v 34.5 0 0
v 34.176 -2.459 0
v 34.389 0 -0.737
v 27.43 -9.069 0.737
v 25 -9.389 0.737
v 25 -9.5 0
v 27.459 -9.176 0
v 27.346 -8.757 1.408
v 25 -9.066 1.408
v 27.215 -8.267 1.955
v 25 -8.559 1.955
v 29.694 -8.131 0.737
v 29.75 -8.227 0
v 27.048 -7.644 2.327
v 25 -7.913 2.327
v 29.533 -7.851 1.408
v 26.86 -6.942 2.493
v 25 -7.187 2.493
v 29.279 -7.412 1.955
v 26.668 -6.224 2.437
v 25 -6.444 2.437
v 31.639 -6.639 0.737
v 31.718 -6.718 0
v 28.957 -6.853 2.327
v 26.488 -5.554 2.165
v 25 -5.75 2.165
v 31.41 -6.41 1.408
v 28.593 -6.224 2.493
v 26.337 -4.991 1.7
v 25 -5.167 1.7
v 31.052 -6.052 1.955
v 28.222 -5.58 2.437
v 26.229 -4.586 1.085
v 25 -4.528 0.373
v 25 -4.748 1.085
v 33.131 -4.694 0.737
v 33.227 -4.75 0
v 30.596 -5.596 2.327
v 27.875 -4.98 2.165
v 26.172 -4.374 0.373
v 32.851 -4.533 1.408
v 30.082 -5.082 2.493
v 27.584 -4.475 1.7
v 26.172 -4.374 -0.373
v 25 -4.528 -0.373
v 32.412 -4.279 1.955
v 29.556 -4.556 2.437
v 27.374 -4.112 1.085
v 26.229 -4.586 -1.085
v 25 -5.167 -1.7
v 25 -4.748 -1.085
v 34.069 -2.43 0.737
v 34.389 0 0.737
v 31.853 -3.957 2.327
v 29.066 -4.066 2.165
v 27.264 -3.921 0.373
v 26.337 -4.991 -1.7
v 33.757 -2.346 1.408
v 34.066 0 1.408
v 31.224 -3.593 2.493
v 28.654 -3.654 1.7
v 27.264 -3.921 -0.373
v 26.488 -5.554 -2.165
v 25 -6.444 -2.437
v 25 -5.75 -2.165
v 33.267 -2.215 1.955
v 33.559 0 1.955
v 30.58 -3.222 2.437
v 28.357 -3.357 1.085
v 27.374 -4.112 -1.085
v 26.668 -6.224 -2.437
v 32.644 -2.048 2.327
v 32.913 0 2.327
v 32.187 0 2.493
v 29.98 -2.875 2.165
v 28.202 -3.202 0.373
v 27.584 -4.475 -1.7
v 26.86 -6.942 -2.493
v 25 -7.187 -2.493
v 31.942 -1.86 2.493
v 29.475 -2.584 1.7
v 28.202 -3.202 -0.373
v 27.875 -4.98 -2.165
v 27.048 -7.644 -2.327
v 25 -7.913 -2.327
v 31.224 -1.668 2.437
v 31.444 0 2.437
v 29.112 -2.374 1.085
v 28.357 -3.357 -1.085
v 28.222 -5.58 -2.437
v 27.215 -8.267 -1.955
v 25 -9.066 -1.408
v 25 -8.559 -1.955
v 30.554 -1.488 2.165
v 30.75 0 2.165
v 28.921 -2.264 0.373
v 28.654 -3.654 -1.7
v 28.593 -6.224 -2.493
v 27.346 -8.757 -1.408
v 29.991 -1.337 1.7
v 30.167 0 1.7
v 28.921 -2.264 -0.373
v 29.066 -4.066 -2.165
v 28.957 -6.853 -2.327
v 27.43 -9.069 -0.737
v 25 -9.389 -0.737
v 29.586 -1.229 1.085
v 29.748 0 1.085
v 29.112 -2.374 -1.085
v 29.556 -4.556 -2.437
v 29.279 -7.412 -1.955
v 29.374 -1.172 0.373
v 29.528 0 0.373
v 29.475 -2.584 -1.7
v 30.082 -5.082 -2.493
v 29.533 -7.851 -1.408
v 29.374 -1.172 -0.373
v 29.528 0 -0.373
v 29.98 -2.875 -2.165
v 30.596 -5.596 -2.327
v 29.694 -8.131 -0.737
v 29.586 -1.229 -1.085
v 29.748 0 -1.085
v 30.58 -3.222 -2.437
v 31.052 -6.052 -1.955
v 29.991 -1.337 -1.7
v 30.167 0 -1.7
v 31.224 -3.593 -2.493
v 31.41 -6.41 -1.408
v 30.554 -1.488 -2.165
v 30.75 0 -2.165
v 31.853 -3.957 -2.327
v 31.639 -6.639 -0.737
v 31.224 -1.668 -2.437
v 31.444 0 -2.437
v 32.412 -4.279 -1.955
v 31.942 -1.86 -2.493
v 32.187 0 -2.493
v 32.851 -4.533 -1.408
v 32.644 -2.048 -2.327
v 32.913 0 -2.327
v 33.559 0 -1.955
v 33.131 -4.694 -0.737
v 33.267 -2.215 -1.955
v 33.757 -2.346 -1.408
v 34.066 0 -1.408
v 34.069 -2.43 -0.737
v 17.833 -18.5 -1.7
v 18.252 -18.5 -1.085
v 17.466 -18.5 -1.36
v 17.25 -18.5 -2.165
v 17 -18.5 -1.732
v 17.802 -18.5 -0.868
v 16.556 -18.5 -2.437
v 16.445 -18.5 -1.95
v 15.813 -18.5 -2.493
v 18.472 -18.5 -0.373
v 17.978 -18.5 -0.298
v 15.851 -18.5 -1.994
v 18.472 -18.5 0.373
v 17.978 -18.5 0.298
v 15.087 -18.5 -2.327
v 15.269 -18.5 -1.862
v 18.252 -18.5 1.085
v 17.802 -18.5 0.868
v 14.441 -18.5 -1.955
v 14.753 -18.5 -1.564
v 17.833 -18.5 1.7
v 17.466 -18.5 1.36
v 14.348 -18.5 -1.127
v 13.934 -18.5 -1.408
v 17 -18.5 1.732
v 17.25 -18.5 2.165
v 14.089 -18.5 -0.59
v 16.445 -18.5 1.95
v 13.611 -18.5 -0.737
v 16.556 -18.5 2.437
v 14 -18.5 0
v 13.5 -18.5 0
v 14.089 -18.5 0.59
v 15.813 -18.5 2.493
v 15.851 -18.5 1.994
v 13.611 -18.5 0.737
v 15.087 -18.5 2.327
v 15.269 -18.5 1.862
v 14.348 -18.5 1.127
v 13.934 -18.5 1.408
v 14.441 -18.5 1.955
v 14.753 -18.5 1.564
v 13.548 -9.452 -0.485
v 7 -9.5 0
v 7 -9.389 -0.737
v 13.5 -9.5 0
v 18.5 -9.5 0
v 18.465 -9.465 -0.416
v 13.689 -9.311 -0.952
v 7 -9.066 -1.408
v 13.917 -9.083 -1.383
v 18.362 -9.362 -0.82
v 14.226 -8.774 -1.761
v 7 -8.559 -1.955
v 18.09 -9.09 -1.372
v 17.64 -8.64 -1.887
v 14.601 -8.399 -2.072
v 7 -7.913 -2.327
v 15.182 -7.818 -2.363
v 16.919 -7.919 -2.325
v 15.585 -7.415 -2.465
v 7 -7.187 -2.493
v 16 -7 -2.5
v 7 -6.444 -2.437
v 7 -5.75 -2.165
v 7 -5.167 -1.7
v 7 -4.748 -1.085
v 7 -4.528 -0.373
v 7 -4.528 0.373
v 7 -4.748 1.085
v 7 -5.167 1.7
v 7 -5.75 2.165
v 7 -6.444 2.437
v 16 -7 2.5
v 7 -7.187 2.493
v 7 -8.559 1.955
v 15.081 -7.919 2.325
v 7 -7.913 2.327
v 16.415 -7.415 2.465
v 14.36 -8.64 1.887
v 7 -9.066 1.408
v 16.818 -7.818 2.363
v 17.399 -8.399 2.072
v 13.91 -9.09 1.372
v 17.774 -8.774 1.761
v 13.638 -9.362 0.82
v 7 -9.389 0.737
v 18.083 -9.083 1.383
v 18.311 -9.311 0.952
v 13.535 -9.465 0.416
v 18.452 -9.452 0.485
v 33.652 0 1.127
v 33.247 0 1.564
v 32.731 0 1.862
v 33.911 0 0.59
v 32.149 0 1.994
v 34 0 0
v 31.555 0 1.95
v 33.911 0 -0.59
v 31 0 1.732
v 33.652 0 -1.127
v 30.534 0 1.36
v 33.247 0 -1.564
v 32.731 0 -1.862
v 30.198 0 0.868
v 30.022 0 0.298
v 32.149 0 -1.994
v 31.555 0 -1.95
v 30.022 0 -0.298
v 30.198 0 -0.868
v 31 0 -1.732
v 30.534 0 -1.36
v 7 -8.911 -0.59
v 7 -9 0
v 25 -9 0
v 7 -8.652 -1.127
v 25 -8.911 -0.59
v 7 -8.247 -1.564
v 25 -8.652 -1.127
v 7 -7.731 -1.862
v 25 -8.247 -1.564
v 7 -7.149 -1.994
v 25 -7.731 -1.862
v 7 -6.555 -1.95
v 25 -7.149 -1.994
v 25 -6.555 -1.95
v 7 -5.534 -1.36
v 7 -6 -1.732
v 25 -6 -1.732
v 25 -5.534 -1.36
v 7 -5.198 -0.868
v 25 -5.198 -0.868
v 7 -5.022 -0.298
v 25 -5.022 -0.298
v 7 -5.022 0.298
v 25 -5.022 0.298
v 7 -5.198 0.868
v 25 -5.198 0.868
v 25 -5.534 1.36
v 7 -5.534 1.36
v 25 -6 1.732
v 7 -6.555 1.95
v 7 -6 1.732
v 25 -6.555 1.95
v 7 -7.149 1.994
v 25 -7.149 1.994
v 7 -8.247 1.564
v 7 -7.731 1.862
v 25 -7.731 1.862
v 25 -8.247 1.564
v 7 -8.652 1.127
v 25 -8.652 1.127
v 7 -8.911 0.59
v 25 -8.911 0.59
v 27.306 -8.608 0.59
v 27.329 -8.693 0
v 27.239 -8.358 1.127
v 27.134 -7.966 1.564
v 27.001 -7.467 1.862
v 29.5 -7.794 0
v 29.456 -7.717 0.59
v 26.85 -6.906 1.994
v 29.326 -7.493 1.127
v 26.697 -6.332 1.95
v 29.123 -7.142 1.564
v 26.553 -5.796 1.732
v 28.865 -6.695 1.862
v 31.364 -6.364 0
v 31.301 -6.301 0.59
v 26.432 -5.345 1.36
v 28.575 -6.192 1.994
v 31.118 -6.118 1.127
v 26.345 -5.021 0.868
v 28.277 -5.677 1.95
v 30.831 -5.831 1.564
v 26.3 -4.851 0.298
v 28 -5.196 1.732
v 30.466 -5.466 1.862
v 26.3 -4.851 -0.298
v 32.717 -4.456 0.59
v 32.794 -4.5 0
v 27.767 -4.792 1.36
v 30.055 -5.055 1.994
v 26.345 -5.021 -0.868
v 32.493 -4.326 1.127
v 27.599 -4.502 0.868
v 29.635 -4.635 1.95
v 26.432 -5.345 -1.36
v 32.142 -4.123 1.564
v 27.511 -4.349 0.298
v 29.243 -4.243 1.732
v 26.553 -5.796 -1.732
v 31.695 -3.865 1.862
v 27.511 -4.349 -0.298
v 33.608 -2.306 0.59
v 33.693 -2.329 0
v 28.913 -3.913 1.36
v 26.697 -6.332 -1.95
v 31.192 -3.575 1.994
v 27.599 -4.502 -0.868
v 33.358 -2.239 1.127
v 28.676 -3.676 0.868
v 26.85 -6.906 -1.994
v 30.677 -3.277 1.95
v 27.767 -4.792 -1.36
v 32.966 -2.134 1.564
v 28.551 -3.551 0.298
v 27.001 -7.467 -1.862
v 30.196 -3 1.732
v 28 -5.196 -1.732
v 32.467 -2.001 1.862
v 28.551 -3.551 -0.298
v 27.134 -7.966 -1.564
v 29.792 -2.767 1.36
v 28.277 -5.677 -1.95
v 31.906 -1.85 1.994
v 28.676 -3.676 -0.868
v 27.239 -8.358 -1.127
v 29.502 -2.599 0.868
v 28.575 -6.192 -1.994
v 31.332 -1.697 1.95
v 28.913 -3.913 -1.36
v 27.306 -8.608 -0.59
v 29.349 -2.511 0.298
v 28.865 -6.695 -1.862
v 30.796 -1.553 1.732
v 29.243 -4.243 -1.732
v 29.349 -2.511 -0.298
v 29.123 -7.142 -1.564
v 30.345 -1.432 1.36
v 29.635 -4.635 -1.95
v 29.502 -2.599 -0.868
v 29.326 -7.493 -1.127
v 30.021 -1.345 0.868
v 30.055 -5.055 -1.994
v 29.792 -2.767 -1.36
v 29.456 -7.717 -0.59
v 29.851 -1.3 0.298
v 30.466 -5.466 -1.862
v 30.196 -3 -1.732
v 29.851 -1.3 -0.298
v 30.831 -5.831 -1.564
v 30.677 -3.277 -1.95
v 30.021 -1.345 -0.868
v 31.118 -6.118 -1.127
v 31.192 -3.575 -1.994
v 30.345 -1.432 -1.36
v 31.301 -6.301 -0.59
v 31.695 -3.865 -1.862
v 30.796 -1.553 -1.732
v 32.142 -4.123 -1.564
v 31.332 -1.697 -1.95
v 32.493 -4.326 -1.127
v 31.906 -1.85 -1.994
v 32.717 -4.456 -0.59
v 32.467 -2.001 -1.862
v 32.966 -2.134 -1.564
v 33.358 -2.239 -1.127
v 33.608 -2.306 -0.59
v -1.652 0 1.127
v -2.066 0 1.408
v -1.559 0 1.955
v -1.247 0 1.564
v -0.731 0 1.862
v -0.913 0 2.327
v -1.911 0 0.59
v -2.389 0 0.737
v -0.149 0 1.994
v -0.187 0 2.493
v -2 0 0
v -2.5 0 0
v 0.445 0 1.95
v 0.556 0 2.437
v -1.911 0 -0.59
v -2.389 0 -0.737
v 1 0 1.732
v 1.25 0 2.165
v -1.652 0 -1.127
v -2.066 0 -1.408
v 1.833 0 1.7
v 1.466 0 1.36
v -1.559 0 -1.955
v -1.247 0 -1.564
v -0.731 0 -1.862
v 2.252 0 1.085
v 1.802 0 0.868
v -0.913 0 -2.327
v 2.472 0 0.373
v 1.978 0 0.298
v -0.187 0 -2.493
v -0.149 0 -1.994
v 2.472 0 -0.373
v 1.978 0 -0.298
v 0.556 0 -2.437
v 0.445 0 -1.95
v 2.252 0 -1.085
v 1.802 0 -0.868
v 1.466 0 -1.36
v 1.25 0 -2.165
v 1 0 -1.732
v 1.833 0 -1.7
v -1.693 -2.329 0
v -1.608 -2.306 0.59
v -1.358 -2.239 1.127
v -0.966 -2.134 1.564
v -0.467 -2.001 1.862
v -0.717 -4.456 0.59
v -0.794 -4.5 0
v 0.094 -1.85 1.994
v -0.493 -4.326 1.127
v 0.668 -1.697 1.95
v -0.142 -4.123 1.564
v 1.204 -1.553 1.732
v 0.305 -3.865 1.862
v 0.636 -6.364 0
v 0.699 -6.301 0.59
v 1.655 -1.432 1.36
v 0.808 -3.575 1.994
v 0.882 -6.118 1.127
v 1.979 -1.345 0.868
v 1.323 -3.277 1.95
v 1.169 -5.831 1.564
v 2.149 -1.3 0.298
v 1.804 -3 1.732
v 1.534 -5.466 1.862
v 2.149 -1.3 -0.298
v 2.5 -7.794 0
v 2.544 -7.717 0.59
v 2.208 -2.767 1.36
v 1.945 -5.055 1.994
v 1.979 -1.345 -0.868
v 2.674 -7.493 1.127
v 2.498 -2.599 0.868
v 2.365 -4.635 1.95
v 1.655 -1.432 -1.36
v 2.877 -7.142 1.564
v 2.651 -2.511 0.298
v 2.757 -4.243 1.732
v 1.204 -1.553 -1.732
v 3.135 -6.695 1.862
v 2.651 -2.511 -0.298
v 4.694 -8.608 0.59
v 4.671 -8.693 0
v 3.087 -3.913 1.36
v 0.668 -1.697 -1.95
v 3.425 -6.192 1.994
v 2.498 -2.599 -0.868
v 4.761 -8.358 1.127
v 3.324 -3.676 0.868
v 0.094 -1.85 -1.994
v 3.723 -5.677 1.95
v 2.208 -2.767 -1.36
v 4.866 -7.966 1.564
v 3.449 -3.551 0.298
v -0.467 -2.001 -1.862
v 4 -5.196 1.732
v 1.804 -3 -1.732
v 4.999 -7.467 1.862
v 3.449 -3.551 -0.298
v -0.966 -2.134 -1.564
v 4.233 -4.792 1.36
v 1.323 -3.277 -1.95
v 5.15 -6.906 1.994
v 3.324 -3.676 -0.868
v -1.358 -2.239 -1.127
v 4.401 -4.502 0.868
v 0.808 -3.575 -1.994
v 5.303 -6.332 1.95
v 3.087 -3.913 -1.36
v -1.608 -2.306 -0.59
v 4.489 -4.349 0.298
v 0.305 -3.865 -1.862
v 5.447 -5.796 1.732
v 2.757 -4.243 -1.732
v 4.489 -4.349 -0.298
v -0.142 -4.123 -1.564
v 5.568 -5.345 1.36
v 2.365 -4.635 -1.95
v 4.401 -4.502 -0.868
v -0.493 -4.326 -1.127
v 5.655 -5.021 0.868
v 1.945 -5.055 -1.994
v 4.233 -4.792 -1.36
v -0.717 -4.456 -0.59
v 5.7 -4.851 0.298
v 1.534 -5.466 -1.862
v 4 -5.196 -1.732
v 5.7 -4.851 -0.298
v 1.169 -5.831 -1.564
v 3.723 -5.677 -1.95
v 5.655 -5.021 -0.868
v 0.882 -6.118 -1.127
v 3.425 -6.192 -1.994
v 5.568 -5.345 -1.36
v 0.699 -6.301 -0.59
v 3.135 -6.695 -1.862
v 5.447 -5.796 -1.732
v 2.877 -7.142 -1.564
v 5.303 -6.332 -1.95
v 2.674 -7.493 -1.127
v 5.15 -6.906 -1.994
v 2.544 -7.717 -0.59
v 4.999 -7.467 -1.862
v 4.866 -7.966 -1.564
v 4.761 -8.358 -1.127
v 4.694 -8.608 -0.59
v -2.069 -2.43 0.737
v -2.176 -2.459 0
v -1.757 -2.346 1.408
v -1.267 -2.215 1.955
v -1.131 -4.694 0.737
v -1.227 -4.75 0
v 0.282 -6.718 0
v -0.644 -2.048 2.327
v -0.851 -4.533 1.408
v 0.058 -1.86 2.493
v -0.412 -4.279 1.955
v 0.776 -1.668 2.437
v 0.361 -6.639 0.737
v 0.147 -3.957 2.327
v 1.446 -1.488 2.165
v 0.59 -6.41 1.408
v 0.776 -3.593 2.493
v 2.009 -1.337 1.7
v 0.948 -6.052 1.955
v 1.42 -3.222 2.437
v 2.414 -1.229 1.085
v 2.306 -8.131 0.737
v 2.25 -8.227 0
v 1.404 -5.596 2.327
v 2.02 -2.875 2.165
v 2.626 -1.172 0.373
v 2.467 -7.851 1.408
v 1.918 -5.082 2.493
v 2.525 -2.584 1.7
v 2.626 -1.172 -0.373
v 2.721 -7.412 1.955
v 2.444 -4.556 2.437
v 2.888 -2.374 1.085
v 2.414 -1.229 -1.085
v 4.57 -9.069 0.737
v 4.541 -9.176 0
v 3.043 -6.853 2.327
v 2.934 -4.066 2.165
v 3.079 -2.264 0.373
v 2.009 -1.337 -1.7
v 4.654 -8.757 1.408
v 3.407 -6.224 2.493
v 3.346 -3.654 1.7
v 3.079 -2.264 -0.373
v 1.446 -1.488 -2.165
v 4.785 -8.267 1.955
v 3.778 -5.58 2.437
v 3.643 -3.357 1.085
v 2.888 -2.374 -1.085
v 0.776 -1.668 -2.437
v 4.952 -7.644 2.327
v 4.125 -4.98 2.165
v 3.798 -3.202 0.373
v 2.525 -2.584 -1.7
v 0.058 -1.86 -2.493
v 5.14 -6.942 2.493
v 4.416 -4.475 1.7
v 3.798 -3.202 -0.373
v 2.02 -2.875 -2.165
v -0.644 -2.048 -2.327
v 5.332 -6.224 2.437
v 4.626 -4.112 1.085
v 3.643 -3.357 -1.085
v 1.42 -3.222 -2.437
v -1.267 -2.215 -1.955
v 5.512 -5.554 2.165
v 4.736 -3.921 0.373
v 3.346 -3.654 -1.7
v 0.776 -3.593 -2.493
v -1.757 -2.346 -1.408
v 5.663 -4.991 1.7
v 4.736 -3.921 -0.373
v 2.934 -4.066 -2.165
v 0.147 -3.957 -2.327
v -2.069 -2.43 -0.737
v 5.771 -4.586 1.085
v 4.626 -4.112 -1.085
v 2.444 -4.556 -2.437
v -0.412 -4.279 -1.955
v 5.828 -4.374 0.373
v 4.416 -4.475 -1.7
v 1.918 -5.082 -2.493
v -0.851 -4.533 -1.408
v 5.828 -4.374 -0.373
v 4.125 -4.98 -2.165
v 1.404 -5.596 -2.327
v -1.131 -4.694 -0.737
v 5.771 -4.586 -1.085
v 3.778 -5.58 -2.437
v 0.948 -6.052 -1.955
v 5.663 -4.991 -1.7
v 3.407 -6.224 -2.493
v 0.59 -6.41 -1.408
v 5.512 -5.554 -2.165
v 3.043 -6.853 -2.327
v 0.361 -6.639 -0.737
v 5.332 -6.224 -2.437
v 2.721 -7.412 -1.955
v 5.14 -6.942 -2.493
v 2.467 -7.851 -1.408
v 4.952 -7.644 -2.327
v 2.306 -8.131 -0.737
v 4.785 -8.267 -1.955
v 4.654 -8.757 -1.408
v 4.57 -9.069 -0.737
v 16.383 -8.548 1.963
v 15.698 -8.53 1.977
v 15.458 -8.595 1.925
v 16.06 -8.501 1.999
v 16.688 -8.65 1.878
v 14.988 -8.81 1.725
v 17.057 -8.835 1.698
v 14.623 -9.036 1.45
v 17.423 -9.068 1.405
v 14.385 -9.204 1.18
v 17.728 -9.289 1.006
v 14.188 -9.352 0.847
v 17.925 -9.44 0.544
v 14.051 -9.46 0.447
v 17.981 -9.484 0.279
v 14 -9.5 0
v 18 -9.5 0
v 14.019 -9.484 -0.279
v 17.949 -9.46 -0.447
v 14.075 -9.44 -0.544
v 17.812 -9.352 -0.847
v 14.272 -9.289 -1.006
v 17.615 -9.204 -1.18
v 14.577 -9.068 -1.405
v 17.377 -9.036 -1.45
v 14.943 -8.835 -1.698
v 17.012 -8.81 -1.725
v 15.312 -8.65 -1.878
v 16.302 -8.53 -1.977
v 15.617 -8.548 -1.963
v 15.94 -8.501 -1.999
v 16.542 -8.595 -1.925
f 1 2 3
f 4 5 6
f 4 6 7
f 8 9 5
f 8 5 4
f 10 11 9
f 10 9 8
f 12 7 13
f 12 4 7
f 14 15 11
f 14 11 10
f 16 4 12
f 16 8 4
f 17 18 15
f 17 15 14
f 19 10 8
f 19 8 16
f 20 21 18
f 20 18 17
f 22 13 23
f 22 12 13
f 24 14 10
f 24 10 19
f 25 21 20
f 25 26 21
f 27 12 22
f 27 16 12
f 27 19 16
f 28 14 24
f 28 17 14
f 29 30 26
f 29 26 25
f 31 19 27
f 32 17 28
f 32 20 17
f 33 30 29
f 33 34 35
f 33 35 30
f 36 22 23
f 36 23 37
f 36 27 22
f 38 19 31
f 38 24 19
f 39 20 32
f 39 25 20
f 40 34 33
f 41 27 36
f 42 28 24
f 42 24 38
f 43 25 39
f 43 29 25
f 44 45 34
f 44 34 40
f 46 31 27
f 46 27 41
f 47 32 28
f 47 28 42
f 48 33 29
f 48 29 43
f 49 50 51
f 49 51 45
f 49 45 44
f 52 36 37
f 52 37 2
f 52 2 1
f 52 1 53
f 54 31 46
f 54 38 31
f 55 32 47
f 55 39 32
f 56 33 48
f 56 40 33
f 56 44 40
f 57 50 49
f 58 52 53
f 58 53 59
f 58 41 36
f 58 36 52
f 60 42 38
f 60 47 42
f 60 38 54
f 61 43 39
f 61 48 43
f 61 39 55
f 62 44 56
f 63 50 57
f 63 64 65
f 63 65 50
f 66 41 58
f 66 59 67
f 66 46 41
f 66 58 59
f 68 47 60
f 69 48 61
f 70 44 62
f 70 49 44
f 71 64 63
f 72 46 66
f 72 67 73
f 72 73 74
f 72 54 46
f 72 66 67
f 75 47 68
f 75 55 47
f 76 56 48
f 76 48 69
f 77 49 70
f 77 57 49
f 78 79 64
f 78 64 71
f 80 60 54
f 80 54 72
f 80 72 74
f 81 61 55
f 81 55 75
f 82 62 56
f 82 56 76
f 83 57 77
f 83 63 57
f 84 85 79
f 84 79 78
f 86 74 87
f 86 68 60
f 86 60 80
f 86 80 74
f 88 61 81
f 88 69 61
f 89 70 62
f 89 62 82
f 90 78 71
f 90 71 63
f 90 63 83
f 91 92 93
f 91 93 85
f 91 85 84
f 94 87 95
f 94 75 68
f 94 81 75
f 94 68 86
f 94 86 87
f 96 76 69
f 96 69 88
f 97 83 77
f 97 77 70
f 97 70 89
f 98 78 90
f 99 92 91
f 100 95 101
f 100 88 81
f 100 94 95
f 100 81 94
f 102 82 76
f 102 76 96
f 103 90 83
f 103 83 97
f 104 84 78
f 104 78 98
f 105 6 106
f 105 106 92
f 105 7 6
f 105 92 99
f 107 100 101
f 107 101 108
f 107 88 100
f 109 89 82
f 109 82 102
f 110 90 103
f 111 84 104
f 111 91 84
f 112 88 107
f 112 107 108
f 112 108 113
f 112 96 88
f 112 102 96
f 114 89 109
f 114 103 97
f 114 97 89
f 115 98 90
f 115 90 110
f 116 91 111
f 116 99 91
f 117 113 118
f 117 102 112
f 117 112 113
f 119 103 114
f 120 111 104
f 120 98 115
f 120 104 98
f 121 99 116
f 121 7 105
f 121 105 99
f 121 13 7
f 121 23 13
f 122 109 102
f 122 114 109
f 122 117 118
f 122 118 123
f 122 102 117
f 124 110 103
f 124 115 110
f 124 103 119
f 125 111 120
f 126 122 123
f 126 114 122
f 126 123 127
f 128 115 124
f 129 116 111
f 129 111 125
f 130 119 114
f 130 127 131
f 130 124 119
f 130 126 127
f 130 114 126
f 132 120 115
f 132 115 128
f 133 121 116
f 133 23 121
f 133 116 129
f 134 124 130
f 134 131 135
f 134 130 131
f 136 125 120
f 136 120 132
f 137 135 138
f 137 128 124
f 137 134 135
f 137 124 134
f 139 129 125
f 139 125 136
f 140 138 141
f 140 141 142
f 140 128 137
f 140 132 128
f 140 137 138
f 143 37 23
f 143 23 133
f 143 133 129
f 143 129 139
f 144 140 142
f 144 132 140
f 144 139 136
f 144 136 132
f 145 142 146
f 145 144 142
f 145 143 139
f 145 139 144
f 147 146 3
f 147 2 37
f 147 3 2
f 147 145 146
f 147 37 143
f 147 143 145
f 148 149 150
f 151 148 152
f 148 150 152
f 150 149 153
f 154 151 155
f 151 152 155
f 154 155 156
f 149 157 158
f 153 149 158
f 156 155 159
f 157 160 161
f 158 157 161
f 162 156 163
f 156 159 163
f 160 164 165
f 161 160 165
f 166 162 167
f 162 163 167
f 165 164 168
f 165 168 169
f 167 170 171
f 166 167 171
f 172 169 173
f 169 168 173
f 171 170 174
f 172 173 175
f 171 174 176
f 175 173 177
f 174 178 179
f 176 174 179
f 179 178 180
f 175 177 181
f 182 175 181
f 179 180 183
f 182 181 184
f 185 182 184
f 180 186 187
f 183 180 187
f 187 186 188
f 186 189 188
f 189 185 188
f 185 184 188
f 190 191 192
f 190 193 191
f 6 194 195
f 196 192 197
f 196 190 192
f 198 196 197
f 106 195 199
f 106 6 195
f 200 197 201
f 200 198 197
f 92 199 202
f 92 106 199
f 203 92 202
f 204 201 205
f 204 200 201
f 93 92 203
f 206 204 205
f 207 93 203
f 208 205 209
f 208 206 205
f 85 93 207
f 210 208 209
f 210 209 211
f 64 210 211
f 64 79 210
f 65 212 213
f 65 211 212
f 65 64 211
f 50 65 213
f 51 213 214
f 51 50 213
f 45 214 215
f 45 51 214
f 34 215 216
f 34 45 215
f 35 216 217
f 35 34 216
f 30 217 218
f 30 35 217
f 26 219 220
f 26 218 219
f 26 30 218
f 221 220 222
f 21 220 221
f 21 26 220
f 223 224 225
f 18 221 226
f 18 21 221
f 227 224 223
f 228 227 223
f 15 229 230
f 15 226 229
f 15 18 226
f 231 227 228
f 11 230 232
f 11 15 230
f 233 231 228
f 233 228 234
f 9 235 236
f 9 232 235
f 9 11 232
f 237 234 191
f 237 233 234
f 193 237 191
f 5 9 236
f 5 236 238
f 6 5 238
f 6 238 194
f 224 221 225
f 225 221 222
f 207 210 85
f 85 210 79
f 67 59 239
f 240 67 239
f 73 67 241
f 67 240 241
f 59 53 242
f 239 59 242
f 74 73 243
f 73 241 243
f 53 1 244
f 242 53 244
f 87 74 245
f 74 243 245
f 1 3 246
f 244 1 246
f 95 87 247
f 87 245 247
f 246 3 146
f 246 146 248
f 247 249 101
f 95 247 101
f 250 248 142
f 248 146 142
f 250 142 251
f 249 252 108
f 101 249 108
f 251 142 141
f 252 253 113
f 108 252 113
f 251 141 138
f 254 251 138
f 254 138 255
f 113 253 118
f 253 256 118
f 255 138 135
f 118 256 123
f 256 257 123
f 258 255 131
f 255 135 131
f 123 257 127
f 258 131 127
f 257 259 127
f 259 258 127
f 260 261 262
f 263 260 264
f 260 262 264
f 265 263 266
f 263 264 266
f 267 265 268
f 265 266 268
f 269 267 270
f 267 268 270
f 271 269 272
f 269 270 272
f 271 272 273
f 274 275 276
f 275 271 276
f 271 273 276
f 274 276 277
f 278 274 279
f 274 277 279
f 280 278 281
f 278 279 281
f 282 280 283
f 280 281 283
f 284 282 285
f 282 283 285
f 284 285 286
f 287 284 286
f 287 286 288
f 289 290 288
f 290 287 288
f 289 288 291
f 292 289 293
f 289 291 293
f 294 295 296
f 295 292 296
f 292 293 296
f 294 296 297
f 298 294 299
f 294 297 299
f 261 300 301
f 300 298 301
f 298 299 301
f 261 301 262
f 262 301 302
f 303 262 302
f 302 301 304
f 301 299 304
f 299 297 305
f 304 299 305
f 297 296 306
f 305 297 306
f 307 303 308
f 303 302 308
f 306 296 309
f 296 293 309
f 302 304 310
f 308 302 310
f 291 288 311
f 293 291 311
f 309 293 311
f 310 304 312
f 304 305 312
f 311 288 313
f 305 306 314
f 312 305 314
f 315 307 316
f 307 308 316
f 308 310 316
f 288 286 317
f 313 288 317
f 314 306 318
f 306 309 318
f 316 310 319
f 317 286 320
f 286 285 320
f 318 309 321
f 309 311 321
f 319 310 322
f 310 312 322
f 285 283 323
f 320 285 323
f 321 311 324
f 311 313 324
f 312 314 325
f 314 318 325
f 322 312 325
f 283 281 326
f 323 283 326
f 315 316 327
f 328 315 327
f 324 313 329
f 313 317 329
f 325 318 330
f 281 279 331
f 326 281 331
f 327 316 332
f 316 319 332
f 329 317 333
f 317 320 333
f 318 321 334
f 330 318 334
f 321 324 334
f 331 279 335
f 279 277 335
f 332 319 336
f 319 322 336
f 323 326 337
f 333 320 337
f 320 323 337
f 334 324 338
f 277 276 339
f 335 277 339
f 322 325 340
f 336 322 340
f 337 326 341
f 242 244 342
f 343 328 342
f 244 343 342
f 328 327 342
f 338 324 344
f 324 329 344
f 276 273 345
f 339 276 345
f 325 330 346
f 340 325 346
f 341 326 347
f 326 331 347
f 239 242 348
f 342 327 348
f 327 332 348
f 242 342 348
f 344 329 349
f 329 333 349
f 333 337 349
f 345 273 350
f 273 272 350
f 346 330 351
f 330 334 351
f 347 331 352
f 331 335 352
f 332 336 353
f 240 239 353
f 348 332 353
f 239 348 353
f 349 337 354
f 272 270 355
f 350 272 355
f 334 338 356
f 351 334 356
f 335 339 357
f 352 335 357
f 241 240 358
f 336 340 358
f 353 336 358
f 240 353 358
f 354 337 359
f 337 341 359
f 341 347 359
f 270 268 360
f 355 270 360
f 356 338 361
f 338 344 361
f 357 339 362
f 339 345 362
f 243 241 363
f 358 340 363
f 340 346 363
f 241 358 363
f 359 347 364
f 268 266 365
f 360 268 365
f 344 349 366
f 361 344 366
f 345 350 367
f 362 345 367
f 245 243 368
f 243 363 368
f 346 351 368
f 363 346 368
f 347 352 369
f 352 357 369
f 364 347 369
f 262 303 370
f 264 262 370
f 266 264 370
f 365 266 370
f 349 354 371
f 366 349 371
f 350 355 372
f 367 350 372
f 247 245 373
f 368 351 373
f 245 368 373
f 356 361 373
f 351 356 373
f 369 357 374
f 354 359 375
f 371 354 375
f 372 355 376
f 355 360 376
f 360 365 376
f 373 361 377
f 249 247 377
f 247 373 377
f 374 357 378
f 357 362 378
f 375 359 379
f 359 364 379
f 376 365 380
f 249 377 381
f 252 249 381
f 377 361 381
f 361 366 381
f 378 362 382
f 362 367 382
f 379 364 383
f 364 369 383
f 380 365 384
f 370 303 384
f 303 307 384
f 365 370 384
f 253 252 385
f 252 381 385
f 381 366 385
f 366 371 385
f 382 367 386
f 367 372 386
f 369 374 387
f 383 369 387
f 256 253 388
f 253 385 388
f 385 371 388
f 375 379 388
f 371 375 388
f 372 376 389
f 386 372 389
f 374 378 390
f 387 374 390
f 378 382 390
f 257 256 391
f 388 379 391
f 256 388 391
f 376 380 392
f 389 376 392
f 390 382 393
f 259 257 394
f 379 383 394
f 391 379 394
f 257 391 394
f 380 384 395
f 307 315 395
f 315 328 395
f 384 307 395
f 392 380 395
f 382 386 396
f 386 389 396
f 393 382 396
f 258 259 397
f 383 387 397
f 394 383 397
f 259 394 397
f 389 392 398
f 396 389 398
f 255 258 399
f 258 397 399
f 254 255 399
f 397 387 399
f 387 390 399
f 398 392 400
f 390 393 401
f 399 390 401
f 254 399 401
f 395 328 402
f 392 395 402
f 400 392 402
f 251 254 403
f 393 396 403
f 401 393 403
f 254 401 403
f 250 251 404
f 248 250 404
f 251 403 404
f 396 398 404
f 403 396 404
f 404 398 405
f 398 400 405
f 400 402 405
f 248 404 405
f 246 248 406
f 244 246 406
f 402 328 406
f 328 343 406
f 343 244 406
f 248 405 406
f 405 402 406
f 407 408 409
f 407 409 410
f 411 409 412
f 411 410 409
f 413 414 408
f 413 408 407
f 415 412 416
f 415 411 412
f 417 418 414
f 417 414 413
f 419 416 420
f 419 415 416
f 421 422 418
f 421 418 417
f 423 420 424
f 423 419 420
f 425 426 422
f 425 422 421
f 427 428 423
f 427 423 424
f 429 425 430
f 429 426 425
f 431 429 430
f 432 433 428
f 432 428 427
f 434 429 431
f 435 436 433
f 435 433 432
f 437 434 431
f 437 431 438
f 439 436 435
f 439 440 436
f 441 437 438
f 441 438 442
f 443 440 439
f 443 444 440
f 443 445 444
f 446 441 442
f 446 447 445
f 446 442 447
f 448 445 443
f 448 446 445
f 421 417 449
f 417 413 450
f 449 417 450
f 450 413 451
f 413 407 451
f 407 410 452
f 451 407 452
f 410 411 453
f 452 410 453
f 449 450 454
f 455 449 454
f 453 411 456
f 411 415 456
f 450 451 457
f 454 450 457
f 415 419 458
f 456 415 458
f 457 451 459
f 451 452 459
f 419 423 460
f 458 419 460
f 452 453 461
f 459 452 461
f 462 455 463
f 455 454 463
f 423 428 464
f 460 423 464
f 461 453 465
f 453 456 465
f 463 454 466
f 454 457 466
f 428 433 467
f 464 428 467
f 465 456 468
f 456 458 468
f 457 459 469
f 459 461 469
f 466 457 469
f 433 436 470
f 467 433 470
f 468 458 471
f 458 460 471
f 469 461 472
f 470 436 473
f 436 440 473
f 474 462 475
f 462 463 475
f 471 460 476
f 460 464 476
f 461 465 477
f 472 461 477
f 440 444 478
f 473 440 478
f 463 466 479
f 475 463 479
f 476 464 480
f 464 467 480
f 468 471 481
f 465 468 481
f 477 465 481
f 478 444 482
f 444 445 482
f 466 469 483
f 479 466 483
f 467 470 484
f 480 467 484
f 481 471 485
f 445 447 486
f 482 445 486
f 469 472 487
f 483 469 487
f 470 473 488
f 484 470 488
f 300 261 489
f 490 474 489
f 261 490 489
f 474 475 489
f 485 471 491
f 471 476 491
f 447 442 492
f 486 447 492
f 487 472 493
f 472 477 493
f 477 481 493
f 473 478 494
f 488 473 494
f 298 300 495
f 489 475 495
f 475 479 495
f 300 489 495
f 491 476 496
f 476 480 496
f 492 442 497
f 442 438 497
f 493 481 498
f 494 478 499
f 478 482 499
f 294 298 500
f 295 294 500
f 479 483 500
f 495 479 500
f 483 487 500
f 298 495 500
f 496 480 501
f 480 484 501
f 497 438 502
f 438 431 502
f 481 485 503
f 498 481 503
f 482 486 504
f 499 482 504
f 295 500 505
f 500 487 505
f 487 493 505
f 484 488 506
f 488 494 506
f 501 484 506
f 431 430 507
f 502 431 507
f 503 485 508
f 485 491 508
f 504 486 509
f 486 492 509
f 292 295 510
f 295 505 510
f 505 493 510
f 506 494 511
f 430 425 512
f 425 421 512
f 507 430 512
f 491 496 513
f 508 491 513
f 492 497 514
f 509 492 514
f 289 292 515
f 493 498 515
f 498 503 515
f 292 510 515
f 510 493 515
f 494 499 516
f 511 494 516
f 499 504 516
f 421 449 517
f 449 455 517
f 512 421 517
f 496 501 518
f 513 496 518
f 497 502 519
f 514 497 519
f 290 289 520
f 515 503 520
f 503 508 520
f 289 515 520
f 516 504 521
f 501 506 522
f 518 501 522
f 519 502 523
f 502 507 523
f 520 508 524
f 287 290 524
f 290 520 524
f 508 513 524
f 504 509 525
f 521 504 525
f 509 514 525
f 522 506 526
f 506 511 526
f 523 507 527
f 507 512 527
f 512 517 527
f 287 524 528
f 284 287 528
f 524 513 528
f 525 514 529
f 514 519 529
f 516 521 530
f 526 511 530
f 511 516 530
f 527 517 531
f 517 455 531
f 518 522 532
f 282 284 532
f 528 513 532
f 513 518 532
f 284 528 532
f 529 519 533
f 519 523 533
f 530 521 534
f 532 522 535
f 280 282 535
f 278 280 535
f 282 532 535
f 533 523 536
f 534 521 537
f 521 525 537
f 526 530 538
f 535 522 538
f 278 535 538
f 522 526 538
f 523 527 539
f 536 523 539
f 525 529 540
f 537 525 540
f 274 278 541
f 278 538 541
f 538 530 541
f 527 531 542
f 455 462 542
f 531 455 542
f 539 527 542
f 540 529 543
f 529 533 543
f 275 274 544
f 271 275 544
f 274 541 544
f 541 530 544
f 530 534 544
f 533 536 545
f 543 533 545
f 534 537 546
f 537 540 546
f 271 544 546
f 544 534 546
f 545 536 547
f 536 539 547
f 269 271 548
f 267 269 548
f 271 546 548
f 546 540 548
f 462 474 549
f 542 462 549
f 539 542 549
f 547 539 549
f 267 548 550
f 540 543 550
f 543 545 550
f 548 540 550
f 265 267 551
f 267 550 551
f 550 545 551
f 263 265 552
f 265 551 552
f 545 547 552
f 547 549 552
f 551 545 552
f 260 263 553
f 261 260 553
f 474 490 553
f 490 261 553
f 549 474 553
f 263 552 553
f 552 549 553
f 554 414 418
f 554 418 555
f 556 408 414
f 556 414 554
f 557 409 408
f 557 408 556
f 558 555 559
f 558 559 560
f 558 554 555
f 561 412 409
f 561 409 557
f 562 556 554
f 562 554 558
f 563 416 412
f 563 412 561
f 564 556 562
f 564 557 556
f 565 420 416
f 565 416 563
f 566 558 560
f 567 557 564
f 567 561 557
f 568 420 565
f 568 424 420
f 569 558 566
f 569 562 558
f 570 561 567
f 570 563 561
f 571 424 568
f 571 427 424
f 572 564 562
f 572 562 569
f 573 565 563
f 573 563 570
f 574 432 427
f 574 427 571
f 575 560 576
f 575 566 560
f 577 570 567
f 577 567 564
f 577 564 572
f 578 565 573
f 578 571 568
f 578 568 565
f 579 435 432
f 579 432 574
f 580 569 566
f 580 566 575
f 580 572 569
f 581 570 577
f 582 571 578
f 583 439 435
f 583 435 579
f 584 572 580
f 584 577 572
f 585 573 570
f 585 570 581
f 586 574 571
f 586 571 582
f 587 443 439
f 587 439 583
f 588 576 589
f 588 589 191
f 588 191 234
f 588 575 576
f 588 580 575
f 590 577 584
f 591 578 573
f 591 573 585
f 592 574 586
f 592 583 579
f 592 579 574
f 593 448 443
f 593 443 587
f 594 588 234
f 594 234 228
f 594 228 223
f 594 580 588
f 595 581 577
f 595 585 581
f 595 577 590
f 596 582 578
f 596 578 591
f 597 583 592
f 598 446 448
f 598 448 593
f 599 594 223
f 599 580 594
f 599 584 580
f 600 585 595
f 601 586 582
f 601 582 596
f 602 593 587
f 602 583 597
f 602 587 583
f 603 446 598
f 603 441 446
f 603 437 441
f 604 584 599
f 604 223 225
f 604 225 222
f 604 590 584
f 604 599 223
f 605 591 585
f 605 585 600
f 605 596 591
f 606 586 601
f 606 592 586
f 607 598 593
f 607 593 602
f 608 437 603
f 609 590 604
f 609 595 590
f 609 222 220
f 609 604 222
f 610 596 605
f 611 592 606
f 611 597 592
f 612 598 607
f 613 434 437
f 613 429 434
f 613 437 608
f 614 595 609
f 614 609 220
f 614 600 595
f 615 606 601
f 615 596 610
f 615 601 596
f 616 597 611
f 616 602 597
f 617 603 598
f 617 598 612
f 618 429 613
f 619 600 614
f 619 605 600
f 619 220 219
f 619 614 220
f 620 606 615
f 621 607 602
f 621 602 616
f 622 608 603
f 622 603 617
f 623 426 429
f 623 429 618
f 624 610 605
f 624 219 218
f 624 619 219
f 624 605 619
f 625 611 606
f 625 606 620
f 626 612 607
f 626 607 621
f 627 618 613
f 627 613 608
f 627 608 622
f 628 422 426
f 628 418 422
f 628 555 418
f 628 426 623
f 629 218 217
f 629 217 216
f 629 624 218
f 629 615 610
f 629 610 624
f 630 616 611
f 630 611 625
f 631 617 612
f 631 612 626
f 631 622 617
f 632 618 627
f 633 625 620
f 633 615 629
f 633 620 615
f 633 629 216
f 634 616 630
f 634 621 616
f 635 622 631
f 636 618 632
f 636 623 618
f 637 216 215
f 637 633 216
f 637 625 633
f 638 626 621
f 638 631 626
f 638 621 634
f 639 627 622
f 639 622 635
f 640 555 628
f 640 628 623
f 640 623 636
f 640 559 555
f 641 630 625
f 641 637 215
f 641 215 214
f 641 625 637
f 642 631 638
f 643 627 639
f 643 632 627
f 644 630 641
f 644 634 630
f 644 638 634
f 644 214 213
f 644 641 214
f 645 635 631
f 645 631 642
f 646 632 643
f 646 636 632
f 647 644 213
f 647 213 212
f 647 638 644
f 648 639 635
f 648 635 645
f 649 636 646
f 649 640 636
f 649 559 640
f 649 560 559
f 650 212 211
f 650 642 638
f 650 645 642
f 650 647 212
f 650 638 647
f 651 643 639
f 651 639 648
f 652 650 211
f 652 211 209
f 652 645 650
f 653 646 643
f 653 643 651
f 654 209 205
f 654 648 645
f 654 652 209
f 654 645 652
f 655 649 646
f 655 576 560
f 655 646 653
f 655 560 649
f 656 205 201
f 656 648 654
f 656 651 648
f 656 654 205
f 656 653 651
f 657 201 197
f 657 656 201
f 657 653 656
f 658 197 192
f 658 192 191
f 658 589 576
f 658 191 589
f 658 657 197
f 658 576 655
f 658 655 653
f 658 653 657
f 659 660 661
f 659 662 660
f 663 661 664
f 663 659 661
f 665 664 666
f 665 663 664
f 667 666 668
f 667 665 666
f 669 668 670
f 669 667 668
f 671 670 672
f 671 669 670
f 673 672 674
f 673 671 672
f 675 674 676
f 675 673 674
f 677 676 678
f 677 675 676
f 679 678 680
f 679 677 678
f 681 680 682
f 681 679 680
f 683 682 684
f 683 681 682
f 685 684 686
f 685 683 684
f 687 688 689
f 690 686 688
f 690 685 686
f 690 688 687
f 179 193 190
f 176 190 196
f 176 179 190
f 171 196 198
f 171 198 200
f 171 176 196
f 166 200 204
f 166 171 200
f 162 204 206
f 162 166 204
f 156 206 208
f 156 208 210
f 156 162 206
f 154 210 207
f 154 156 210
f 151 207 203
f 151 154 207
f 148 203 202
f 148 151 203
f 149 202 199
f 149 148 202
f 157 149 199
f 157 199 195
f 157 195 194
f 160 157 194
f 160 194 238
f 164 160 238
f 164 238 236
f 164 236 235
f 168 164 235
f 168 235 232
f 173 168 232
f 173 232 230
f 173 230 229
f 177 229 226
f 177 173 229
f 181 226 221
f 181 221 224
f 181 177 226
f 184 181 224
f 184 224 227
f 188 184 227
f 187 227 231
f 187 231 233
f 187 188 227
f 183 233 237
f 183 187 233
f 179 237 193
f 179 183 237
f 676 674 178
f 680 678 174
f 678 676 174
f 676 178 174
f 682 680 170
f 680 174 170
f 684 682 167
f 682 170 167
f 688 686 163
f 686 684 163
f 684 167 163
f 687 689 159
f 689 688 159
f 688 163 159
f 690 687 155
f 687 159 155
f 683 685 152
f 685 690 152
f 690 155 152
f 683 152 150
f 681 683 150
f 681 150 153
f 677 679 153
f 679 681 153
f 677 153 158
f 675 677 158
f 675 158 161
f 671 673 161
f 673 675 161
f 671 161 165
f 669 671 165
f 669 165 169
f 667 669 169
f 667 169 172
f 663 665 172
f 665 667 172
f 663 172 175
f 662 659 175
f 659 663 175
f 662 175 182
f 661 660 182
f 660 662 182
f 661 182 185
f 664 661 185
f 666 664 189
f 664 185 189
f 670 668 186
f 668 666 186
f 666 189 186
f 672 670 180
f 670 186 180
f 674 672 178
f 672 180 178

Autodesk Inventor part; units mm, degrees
ref_plane "YZ Plane" through (0, 0, 0) normal (1, 0, 0) x (0, 1, 0)
ref_plane "XY Plane" through (0, 0, 0) normal (0, 0, 1) x (1, 0, 0)
sketch "Sketch1" plane through (0, 0, 0) normal (0, 1, 0) x (-1, 0, 0)
  circle A0 centre (0, 0) radius 2.5
  circle A1 centre (0, 0) radius 2
  dimension "d0" = 5
  dimension "d1" = 4
sketch "Sketch2" plane through (0, 0, 0) normal (0, 0, 1) x (1, 0, 0)
  line L0 (0, 0) -> (0, 0)
  line L1 (7, -7) -> (25, -7)
  line L2 (32, 0) -> (32, 0)
  arc A0 (0, 0) -> (7, -7) centre (7, 0) ccw
  arc A1 (25, -7) -> (32, 0) centre (25, 0) ccw
  point P0 (0, -7)
  point P1 (32, -7)
  dimension "d3" = 32
  dimension "d4" = 7
  dimension "d5" = 7
sweep "Sweep1" add profiles "Sketch1" path "Sketch2"
ref_plane "Work Plane1" through (0, -18.5, 0) normal (0, 1, 0) x (-1, 0, 0)
sketch "Sketch3" plane through (0, -18.5, 0) normal (0, 1, 0) x (-1, 0, 0)
  circle A0 centre (-16, 0) radius 2.5
  circle A1 centre (0, 0) radius 2.5 projected
  circle A2 centre (-16, 0) radius 2
  dimension "d9" = 5
  dimension "d10" = 16
  dimension "d11" = 4
extrude "Extrusion1" add sketch "Sketch3" along normal up to surface contours A0
properties part number "25"
